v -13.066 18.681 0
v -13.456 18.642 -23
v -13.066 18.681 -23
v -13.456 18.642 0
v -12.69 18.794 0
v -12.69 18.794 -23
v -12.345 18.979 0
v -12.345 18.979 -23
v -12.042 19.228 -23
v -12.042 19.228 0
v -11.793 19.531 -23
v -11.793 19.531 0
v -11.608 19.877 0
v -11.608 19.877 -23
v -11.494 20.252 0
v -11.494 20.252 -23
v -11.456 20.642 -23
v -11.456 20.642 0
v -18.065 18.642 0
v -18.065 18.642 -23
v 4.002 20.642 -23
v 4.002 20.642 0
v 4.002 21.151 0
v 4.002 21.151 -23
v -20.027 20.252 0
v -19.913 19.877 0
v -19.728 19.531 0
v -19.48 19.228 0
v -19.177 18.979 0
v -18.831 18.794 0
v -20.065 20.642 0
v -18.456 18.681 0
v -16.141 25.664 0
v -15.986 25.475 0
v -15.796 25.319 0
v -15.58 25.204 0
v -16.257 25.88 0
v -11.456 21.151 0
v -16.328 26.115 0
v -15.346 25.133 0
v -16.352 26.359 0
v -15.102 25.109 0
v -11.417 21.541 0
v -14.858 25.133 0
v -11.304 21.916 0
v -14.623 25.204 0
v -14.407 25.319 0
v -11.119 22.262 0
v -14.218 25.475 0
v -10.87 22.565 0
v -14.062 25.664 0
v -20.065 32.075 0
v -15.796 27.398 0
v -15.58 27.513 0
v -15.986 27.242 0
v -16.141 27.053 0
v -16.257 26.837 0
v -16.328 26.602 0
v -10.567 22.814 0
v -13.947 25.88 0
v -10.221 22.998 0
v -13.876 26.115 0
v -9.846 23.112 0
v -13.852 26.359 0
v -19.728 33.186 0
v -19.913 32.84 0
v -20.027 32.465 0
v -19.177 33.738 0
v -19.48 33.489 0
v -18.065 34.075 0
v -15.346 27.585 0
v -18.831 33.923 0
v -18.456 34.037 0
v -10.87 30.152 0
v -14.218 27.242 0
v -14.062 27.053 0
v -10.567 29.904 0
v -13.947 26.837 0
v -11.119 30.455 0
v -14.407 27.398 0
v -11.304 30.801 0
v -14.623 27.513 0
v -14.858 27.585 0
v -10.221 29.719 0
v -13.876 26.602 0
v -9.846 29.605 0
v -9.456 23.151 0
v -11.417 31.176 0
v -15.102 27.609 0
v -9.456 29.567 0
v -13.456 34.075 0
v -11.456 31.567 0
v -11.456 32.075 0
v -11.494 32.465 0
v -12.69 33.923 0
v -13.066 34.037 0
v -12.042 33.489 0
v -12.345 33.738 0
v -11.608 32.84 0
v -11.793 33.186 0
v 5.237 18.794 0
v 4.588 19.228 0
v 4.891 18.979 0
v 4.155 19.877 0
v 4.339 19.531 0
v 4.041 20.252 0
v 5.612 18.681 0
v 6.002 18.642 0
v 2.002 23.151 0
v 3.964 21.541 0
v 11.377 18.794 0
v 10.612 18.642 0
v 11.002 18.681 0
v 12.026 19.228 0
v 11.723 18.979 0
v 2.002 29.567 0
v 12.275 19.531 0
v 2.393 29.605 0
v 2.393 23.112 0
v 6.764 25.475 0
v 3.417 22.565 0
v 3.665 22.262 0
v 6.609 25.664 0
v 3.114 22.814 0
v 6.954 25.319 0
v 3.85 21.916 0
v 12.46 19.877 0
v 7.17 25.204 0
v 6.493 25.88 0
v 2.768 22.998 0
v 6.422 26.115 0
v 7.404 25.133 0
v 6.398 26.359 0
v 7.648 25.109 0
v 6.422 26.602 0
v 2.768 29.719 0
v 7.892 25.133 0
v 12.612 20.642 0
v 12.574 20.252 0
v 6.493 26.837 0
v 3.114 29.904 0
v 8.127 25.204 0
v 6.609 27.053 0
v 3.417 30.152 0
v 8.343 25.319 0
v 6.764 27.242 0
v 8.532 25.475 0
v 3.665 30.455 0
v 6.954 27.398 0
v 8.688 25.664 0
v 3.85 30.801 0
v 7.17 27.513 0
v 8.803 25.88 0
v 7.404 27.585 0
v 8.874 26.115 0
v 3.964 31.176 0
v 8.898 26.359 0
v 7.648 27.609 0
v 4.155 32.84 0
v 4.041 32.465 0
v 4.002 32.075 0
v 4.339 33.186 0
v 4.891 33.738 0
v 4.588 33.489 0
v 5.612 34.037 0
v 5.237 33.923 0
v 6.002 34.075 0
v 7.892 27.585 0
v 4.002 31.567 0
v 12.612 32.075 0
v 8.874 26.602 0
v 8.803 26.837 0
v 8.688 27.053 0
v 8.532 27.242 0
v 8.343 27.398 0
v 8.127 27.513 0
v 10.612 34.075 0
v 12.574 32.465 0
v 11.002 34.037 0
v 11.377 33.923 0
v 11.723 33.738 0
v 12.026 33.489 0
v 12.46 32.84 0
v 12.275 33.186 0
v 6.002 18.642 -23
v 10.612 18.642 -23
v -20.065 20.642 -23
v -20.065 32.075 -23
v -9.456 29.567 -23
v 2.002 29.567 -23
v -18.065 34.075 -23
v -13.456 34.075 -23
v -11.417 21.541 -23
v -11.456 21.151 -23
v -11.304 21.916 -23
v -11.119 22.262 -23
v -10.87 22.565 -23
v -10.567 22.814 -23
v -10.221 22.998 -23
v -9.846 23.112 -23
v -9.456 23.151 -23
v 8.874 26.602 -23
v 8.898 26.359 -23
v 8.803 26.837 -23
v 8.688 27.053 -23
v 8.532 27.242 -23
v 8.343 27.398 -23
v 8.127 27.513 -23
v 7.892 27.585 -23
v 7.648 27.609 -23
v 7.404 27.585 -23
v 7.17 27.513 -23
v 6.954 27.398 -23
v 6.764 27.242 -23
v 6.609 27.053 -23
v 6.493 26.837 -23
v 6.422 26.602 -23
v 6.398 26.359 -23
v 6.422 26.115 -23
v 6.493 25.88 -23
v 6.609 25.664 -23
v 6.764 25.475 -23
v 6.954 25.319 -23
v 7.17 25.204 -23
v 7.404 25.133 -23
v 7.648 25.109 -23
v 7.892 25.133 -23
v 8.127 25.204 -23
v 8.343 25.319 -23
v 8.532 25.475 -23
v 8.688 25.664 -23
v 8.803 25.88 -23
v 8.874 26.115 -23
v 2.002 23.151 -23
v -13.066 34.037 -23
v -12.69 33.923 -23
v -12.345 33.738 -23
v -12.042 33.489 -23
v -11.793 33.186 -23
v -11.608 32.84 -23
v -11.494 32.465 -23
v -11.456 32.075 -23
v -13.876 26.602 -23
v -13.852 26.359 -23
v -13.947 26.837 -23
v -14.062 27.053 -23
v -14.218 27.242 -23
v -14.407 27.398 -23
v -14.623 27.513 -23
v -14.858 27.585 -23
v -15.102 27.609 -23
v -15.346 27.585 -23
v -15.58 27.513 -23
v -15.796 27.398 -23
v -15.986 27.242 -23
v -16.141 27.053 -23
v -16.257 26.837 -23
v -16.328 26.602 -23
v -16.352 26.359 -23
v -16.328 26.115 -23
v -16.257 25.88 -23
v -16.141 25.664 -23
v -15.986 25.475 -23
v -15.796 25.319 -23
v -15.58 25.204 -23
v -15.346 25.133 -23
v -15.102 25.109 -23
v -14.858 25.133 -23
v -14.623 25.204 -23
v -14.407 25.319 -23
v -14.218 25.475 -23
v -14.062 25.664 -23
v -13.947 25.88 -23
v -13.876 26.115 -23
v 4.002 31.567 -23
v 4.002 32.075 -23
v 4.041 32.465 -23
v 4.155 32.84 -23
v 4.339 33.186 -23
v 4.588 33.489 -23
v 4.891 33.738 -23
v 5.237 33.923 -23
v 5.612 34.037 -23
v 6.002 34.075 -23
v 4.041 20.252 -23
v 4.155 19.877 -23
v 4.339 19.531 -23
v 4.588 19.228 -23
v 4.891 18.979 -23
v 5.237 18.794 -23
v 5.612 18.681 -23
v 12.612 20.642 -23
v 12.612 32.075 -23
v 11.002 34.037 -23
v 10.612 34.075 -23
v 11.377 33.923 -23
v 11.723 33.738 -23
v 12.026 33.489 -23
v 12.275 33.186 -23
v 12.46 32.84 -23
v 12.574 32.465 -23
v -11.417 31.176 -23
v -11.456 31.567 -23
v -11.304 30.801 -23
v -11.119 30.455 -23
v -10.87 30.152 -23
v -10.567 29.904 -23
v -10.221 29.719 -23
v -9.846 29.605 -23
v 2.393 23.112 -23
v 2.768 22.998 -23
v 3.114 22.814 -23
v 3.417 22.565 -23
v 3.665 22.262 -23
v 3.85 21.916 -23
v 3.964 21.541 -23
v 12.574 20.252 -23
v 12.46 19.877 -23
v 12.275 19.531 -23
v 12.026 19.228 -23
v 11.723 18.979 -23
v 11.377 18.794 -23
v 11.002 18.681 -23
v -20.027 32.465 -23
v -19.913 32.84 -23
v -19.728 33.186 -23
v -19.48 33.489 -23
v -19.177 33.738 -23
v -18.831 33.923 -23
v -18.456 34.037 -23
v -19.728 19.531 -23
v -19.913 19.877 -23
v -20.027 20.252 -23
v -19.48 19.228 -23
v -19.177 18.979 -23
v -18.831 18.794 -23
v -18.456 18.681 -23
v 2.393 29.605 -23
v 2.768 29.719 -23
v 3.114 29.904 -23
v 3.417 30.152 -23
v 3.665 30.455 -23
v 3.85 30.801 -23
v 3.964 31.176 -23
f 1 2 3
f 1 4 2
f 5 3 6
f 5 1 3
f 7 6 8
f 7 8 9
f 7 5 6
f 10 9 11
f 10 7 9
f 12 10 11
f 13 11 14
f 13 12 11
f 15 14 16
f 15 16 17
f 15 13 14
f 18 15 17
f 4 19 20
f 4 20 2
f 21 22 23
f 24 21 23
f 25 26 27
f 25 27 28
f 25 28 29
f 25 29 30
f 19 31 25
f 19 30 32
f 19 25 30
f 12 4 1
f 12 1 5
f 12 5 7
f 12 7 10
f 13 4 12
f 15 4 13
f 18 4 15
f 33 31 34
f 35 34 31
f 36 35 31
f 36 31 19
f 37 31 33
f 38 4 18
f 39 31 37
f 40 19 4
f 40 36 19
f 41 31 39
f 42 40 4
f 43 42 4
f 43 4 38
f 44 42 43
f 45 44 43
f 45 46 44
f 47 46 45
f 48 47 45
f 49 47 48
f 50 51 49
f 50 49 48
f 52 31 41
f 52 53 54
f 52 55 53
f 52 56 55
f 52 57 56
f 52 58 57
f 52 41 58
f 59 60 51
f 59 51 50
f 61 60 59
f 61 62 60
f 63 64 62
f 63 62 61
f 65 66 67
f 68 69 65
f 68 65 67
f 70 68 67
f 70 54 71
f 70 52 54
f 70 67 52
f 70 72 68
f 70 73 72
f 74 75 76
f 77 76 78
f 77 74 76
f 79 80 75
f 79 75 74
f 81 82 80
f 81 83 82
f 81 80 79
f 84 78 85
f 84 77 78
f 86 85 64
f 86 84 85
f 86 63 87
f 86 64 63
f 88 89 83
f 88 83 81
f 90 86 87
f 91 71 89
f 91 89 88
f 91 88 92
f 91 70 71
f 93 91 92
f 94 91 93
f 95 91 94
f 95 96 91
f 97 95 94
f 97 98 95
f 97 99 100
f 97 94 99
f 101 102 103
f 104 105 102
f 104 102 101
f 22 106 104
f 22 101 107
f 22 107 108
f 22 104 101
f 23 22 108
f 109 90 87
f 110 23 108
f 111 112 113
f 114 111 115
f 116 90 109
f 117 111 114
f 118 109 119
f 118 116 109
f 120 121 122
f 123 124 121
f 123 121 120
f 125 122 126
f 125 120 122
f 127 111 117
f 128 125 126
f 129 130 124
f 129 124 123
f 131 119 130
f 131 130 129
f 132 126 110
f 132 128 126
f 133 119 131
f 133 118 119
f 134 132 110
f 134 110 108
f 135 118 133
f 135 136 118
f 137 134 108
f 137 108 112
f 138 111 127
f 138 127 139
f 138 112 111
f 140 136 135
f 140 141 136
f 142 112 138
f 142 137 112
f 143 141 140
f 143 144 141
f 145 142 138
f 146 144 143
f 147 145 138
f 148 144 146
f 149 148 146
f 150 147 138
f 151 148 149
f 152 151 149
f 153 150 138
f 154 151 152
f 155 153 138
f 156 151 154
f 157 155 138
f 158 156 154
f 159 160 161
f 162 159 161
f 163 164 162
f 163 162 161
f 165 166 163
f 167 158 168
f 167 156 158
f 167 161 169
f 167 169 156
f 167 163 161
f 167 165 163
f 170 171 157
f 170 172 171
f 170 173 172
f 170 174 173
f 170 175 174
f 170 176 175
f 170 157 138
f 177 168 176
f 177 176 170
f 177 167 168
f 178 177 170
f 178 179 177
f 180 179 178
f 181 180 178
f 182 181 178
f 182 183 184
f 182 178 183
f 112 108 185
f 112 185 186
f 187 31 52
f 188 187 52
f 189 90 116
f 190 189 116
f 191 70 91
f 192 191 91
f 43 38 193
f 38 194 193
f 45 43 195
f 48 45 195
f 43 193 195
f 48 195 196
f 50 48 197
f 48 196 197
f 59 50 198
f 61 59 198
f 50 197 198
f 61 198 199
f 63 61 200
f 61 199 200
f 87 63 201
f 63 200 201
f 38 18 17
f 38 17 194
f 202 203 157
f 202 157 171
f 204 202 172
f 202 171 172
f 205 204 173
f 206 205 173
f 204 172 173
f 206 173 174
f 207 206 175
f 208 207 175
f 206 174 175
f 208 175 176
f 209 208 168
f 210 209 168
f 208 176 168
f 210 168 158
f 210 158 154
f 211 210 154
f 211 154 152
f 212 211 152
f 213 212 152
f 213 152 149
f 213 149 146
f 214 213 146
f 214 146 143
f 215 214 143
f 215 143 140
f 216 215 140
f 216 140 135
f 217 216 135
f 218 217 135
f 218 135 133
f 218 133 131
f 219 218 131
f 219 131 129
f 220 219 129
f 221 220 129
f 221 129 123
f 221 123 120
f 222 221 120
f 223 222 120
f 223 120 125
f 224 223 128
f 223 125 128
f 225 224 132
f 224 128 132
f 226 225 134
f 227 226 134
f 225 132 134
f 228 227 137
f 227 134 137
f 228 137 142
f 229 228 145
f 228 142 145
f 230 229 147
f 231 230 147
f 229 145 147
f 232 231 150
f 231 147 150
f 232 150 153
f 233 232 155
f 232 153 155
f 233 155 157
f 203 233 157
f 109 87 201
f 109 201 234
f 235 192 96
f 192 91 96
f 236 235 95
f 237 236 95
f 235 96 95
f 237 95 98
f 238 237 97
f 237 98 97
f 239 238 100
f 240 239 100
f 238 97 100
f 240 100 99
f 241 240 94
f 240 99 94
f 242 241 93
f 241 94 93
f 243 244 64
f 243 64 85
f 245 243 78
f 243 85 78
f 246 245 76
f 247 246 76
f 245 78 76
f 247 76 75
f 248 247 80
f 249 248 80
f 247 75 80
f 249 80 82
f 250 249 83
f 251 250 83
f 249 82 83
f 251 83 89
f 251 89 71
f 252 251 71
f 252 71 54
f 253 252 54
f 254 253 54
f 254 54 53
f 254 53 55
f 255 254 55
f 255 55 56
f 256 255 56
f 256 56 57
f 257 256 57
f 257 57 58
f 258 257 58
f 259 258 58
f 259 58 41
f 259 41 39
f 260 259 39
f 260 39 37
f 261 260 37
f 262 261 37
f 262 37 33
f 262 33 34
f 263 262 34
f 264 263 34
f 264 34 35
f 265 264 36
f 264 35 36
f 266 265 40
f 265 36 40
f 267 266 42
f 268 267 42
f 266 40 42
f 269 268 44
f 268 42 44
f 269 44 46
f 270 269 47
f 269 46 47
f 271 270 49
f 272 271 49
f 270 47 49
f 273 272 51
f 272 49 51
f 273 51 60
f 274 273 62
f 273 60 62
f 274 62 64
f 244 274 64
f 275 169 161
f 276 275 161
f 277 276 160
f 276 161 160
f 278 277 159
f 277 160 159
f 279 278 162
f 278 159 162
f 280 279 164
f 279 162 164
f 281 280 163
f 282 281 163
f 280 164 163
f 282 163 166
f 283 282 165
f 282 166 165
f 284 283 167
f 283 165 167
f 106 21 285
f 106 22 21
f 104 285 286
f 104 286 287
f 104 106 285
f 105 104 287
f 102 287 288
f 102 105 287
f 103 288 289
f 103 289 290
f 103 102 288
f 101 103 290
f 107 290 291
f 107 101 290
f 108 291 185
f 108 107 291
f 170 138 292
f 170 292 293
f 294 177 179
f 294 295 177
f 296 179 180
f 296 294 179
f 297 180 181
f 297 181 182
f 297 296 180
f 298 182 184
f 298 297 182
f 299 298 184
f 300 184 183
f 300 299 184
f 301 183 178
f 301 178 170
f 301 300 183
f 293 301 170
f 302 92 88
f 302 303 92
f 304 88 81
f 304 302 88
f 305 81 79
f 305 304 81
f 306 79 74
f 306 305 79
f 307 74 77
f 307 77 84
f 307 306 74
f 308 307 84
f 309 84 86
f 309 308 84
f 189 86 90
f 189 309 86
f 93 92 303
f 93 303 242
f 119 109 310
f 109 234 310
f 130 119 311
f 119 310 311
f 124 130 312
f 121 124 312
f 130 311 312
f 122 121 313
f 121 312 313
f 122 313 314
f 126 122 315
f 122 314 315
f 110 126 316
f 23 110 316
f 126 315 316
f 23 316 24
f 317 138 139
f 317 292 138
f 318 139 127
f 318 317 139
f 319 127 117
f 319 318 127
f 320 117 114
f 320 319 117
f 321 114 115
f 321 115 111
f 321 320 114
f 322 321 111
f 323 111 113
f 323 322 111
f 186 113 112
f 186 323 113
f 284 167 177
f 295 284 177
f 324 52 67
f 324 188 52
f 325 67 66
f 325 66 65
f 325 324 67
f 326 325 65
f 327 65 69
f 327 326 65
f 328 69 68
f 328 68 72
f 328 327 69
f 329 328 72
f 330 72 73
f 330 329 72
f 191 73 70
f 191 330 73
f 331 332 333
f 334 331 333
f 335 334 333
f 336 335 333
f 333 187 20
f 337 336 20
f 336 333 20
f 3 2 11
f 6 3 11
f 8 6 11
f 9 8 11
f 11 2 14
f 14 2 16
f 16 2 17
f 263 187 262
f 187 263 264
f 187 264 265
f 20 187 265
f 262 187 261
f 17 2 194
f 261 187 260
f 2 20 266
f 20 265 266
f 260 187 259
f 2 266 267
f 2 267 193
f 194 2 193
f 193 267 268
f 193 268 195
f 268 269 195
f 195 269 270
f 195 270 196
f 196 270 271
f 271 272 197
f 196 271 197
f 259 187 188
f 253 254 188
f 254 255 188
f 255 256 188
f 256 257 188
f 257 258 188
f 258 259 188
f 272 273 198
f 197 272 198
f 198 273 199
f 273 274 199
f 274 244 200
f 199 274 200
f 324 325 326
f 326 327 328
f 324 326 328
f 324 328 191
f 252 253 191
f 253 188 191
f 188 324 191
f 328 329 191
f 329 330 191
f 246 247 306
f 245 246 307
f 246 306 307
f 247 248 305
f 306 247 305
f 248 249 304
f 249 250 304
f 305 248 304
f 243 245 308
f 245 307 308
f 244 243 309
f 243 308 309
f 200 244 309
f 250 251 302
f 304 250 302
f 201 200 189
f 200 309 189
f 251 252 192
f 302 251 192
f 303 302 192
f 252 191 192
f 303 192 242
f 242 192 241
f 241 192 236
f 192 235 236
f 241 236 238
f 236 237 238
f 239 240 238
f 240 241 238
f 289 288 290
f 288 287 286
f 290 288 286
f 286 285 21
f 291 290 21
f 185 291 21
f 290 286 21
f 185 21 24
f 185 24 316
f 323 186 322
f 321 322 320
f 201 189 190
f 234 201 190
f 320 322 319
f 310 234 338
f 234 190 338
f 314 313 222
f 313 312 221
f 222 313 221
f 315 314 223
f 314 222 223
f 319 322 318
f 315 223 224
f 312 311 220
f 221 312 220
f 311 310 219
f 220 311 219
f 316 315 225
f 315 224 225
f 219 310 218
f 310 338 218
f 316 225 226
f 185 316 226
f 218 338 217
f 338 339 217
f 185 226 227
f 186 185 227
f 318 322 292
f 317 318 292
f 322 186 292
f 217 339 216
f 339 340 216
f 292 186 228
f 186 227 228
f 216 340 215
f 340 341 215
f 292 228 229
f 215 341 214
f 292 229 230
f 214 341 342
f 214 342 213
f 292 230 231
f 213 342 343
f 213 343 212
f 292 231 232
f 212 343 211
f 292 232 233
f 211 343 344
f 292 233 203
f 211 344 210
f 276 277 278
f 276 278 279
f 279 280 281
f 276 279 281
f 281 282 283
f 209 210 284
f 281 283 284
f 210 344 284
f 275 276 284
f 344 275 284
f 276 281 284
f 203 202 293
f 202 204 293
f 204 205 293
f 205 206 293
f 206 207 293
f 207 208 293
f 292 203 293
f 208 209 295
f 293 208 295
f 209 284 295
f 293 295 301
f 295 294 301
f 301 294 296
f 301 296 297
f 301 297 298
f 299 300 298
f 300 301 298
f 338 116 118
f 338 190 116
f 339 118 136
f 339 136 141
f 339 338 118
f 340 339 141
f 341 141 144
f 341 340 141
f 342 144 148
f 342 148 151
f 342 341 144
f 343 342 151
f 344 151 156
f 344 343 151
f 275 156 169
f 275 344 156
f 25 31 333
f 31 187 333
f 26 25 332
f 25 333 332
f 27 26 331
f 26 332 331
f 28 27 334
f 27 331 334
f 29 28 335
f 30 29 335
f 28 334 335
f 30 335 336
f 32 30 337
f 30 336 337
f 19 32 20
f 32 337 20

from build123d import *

# Parameters (mm, degrees)
SKETCH_1_W          = 32.677388302
SKETCH_1_H          = 15.432977872
EXTRUDE_1_DEPTH     = 23
SKETCH_2_R          = 1.25
SKETCH_2_W          = 15.458117654
SKETCH_2_H          = 9.017063249
CUT_EXTRUDE_1_DEPTH = 24
FILLET_1_R          = 2
FILLET_2_R          = 2


with BuildPart() as part:
    # 草图1 → 凸台-拉伸1 (new body)
    with BuildSketch(Plane.XY):
        with Locations((-3.726697353, 26.358574689)):
            Rectangle(SKETCH_1_W, SKETCH_1_H)
    extrude(amount=-EXTRUDE_1_DEPTH)

    # 草图2 → 切除-拉伸1 (cut, through all)
    with BuildSketch(Plane.XY):
        with Locations((-15.101697353, 26.358574689)):
            Circle(SKETCH_2_R)
        with Locations((7.648302647, 26.358574689)):
            Circle(SKETCH_2_R)
        with Locations((-3.726697353, 18.642085753)):
            Rectangle(SKETCH_2_W, SKETCH_2_H)
        with Locations((-3.726697353, 34.075063626)):
            Rectangle(SKETCH_2_W, SKETCH_2_H)
    extrude(amount=-CUT_EXTRUDE_1_DEPTH, mode=Mode.SUBTRACT)

    # 圆角1
    fillet_1_edges = [part.edges().sort_by_distance(p)[0] for p in [
        (12.611996798, 18.642085753, -11.5),
        (-20.065391504, 18.642085753, -11.5),
        (-20.065391504, 34.075063625, -11.5),
        (12.611996798, 34.075063625, -11.5),
    ]]
    fillet(fillet_1_edges, radius=FILLET_1_R)

    # 圆角2
    fillet_2_edges = [part.edges().sort_by_distance(p)[0] for p in [
        (-11.45575618, 34.075063625, -11.5),
        (4.002361474, 34.075063625, -11.5),
        (-11.45575618, 29.566532001, -11.5),
        (4.002361474, 29.566532001, -11.5),
        (4.002361474, 18.642085753, -11.5),
        (-11.45575618, 18.642085753, -11.5),
        (4.002361474, 23.150617378, -11.5),
        (-11.45575618, 23.150617378, -11.5),
    ]]
    fillet(fillet_2_edges, radius=FILLET_2_R)


solid = part.part
